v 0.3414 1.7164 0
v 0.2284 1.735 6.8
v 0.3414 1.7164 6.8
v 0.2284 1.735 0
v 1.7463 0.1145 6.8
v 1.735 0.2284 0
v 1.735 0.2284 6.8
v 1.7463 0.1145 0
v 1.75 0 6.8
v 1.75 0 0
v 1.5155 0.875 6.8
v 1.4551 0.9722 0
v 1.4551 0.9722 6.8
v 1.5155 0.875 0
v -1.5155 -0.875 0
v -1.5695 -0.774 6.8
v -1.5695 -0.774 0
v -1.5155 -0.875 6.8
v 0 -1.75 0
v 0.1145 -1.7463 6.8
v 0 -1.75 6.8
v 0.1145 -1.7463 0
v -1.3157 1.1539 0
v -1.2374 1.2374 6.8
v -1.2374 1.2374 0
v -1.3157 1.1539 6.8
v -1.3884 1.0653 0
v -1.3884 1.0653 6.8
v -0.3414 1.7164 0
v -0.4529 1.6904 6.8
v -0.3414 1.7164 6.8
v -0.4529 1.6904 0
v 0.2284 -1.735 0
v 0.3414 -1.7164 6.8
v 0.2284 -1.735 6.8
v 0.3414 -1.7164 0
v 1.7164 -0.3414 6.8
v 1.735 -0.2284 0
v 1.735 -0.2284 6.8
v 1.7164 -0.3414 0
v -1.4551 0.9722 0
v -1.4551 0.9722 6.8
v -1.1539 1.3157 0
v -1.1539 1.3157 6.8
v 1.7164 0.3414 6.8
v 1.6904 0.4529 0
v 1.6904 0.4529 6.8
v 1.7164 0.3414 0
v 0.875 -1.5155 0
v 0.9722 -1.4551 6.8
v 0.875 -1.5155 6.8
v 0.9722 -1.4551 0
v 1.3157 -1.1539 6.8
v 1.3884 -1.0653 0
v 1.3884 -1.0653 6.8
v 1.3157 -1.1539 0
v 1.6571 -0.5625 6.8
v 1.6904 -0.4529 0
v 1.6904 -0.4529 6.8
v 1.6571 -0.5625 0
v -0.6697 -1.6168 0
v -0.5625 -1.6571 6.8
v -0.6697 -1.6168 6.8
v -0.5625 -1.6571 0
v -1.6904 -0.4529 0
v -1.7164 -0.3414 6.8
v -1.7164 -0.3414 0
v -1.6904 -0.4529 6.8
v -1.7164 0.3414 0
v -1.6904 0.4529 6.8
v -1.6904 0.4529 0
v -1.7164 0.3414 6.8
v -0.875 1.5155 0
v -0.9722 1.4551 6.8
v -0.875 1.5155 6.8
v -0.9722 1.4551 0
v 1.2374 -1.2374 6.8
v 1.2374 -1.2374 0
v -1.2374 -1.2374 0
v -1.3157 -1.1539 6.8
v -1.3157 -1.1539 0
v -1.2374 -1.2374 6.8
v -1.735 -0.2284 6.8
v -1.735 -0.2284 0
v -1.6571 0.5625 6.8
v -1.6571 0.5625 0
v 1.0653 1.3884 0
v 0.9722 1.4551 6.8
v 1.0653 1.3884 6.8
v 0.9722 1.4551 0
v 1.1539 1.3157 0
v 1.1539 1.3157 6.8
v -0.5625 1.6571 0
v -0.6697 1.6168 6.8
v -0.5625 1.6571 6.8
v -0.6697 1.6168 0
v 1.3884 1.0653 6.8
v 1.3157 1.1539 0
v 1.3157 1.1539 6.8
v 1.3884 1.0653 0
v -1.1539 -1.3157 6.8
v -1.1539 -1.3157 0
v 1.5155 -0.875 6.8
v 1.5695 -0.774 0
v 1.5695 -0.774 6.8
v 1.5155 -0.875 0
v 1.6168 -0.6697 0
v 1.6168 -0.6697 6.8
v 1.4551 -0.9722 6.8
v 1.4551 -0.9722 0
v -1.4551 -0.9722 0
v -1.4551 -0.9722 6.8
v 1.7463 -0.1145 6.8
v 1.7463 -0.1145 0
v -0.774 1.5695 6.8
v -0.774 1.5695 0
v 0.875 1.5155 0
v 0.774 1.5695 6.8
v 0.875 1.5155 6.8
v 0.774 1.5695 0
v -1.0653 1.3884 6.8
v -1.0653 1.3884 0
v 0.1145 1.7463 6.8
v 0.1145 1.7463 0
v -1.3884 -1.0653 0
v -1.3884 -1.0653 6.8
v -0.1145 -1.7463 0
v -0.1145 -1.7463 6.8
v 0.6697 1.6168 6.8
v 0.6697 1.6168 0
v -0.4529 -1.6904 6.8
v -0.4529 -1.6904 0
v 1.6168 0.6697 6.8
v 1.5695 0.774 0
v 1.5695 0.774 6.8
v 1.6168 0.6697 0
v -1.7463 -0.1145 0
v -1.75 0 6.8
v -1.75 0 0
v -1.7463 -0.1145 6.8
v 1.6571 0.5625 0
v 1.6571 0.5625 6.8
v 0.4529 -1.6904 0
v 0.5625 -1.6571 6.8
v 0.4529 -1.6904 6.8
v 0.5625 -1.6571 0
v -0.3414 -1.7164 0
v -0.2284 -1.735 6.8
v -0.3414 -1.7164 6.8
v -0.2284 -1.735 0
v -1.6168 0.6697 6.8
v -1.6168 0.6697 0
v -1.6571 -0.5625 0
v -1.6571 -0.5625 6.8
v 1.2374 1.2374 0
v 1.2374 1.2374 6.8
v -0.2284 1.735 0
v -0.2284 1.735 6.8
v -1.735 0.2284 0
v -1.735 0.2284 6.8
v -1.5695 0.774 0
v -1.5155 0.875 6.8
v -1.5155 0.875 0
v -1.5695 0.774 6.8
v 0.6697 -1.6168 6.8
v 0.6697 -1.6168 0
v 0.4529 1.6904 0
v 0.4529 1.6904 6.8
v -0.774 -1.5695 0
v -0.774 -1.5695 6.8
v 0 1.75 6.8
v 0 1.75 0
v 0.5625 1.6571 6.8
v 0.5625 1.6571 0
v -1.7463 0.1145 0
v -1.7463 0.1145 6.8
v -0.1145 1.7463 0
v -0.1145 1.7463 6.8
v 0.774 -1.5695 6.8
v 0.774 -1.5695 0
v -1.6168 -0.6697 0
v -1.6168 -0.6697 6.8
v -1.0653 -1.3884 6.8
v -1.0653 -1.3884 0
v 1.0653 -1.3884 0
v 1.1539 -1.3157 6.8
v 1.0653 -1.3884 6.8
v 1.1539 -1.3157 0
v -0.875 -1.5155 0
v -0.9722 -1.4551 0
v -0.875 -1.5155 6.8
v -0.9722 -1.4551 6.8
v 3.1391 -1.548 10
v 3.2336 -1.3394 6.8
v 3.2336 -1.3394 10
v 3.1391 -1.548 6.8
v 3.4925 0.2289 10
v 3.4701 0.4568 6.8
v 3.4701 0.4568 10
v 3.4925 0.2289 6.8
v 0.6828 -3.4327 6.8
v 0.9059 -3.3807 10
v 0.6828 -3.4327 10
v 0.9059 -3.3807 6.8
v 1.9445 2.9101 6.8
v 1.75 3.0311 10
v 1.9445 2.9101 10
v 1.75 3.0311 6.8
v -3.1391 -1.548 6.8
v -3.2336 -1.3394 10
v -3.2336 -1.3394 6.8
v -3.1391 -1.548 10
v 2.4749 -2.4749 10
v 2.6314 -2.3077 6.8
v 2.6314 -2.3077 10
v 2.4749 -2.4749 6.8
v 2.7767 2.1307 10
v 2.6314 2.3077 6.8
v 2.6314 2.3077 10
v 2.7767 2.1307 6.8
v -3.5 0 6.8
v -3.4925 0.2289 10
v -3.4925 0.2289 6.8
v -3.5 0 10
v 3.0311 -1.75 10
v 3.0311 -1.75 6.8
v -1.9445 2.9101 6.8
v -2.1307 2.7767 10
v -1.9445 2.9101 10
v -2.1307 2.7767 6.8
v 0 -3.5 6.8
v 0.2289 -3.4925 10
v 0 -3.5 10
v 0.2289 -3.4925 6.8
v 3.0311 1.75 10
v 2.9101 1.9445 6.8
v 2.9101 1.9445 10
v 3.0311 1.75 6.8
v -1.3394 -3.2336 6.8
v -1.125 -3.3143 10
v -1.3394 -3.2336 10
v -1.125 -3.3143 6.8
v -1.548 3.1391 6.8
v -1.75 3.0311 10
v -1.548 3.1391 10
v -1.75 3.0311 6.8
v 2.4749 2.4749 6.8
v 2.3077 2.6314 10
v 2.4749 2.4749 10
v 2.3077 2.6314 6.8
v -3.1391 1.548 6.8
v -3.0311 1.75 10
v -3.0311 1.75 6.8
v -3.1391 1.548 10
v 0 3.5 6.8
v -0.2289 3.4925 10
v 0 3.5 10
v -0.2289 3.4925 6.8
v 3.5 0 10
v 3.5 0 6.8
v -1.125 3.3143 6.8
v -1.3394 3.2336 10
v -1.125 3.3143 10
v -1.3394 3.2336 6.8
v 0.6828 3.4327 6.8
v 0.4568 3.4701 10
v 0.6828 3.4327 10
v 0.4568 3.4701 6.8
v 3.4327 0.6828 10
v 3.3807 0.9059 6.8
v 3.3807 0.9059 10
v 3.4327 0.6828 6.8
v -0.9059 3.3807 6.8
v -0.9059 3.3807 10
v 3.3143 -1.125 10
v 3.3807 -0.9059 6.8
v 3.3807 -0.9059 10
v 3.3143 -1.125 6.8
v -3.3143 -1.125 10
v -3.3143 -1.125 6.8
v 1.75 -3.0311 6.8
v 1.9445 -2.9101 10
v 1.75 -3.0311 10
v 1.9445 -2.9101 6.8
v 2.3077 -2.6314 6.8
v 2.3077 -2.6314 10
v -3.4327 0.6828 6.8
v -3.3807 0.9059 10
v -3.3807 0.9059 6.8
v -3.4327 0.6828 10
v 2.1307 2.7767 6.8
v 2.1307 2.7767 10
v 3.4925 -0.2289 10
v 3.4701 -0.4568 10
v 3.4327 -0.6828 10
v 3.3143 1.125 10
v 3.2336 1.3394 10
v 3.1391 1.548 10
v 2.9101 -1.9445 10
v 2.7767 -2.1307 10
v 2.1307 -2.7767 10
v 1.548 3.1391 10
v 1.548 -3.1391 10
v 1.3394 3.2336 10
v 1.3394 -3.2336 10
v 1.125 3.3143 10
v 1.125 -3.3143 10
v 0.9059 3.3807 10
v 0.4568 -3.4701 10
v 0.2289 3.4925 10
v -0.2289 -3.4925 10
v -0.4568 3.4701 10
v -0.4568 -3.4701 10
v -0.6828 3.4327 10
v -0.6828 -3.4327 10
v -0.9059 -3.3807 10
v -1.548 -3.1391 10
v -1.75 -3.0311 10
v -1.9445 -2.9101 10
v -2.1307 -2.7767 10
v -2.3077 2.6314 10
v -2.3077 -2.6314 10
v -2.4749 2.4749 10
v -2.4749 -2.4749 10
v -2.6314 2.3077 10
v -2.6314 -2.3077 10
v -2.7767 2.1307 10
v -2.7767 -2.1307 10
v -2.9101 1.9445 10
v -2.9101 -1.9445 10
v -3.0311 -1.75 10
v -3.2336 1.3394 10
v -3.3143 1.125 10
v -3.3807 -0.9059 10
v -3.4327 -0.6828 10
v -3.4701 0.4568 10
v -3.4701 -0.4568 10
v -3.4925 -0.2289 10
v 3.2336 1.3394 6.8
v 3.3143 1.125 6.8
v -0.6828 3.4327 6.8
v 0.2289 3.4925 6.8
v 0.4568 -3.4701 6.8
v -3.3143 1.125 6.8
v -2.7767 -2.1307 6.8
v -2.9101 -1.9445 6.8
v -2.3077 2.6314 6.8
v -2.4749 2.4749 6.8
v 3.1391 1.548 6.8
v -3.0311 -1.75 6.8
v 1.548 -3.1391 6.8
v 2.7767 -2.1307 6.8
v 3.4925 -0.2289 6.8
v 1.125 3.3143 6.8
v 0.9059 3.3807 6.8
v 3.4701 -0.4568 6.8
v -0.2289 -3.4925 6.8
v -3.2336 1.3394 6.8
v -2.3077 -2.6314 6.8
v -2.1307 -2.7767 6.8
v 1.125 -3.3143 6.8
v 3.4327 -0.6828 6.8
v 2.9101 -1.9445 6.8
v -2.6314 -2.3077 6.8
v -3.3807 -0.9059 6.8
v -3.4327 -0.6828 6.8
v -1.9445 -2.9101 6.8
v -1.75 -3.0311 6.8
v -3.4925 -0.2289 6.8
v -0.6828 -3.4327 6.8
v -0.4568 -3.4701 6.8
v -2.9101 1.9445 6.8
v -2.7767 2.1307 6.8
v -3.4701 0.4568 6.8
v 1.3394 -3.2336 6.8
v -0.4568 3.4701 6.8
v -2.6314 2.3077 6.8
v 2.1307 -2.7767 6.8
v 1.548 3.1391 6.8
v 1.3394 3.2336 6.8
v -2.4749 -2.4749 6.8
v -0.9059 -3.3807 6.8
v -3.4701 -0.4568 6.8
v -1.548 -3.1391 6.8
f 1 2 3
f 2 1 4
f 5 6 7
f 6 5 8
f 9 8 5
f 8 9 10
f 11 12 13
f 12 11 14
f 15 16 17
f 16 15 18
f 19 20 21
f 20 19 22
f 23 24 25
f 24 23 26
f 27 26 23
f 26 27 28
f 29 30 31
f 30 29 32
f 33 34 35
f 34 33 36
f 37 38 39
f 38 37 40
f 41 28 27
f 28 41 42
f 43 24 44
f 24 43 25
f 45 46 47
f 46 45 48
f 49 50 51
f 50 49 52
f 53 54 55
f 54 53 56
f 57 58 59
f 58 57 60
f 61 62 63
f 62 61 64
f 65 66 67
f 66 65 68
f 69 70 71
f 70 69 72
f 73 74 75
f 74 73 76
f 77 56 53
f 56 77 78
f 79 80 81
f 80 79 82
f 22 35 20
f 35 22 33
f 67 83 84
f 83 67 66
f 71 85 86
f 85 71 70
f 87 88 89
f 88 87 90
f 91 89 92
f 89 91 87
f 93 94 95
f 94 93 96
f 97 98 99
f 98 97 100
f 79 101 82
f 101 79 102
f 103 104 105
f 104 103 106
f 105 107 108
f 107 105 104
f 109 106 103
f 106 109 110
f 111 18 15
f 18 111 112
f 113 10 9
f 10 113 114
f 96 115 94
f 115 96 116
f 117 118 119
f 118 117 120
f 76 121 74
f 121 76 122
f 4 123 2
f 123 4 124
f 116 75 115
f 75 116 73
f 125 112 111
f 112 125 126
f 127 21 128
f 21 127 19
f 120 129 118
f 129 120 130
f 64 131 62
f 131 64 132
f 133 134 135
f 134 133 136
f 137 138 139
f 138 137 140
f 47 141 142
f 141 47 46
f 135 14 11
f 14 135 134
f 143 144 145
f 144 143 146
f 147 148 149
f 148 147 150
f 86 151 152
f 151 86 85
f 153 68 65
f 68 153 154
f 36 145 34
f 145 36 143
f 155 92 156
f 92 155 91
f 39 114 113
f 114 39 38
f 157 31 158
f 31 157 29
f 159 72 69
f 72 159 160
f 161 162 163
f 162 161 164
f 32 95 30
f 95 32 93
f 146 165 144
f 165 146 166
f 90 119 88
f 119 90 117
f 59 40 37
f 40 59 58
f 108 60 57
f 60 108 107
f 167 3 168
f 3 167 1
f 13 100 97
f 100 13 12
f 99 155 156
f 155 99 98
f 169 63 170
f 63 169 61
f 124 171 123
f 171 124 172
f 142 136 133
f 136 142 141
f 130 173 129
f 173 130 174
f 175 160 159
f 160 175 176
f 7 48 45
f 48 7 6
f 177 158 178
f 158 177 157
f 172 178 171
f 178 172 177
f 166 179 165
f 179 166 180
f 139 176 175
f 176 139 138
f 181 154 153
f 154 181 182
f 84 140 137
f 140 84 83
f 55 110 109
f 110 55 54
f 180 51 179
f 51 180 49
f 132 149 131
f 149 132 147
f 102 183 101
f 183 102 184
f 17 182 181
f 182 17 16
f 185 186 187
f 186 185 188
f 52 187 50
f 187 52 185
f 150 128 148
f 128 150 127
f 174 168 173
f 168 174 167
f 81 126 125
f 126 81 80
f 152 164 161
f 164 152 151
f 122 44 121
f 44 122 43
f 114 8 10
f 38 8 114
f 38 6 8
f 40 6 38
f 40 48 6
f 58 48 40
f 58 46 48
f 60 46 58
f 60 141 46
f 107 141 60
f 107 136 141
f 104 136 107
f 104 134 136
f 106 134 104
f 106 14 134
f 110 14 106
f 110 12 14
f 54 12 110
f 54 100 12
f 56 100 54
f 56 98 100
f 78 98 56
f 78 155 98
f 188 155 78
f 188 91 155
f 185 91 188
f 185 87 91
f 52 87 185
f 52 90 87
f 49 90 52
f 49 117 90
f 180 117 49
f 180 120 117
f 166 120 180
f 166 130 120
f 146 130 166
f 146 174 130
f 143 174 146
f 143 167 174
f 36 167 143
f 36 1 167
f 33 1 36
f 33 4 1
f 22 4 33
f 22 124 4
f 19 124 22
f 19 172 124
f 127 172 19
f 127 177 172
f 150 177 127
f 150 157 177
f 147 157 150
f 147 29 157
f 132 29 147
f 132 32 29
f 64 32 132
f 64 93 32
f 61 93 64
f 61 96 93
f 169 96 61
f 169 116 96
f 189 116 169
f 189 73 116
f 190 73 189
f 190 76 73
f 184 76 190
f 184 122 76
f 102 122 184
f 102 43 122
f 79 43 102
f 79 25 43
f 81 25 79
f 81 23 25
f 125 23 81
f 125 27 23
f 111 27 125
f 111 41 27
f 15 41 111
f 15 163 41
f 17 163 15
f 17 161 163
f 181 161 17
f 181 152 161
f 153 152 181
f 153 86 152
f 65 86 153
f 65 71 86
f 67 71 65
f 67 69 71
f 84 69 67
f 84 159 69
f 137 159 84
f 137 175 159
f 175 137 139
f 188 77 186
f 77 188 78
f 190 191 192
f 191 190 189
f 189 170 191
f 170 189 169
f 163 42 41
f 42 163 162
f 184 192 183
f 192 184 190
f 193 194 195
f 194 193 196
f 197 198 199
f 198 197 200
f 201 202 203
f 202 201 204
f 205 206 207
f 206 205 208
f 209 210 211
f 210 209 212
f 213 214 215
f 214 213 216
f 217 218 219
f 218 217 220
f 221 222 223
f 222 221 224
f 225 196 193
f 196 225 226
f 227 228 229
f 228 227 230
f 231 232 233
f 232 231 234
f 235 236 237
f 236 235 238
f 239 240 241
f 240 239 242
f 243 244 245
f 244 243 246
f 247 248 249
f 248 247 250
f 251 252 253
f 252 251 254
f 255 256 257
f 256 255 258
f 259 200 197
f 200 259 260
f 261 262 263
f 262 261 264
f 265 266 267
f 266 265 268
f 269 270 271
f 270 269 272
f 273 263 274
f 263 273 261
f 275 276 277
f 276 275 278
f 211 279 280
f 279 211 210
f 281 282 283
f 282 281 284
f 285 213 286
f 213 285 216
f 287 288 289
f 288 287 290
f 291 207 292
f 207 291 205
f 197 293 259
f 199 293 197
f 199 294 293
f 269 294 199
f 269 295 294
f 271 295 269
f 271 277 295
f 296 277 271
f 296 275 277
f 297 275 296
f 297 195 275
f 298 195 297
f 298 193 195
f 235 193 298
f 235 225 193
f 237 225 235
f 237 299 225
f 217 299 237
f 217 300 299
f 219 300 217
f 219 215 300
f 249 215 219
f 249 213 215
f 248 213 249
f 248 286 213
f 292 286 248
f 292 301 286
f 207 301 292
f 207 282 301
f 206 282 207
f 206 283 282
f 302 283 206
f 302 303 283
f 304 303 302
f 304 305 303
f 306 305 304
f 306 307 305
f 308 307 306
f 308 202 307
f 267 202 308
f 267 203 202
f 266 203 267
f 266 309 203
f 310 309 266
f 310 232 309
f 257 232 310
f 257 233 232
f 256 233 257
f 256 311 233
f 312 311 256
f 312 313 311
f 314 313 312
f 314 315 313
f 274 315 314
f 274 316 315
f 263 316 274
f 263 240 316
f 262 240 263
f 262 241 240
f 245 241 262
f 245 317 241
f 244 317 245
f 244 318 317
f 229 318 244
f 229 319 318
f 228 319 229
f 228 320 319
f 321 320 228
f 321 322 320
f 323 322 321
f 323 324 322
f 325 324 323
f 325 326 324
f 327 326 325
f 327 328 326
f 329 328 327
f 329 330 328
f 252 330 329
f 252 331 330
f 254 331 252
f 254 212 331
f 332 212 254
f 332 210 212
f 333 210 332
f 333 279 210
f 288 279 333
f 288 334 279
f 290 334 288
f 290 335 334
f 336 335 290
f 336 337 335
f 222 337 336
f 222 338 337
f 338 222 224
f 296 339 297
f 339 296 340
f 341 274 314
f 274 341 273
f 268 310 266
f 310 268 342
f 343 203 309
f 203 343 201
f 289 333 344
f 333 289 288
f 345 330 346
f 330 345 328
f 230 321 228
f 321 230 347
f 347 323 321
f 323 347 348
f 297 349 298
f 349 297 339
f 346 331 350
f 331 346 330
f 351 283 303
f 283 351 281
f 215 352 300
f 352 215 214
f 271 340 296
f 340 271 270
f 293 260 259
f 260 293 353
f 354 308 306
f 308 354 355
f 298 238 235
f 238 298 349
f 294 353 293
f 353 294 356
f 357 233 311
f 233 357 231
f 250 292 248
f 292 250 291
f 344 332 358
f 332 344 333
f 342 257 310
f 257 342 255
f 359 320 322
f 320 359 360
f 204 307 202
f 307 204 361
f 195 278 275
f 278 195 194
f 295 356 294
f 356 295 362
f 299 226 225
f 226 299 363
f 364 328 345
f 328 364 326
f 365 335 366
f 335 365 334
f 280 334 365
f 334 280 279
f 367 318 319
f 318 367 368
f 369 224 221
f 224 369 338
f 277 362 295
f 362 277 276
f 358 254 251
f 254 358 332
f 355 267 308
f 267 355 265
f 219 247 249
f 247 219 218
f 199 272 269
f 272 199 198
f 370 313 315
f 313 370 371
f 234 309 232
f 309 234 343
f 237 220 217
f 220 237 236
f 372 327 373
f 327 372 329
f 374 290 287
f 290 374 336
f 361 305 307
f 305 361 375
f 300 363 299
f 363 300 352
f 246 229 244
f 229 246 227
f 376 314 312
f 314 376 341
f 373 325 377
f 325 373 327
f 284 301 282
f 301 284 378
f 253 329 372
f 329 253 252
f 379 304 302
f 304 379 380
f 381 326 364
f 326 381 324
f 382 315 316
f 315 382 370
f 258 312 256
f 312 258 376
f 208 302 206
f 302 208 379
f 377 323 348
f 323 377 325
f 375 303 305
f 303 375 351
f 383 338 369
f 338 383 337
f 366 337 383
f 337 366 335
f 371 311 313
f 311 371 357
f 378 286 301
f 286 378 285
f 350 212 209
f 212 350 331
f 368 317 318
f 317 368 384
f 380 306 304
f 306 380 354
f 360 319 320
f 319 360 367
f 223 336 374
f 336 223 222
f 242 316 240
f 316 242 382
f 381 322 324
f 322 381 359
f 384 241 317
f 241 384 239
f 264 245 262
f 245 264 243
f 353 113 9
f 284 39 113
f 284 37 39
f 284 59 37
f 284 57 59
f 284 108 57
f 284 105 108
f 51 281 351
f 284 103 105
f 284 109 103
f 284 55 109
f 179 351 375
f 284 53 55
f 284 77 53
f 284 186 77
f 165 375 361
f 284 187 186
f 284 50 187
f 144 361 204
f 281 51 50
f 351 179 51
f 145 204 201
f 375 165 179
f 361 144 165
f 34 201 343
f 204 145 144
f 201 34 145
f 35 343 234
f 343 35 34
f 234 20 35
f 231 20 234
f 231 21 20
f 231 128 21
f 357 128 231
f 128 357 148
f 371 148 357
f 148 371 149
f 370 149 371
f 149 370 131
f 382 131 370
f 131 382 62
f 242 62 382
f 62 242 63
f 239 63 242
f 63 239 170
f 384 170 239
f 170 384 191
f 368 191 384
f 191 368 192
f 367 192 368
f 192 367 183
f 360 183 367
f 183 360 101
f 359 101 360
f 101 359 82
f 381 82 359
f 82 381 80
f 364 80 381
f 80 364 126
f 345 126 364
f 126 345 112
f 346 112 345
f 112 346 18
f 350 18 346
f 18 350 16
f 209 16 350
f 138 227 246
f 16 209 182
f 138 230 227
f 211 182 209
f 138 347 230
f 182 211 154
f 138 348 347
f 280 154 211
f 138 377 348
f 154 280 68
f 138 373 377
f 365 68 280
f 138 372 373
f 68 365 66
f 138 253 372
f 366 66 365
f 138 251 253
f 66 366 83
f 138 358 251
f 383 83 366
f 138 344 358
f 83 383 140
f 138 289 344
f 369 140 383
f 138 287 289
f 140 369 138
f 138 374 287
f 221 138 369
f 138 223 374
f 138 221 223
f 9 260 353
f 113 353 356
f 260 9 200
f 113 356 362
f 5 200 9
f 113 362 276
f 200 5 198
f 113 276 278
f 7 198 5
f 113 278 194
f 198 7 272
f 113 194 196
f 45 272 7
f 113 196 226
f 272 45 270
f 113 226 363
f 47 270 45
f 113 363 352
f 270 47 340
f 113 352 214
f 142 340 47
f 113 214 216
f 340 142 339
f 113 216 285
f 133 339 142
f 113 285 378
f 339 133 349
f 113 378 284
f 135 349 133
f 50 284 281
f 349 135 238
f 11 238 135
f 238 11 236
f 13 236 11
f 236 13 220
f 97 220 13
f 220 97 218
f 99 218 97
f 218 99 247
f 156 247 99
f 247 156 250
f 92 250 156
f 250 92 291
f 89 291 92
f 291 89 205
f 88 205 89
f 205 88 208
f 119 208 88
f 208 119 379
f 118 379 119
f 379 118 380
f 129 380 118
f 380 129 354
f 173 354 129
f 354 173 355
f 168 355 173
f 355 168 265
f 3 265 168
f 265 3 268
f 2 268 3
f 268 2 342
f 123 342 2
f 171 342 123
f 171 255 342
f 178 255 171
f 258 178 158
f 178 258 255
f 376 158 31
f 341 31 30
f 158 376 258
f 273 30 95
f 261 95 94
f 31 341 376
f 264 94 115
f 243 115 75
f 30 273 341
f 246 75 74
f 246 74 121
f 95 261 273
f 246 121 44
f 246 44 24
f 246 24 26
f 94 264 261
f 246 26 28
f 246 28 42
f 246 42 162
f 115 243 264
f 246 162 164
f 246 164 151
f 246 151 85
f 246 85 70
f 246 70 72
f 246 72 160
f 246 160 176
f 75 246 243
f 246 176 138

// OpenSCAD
$fn = 96;

module screw(shaft_d=3.5, head_d=7.0, total_len=10.0, head_h=3.0, overlap=0.2) {
    shaft_h = total_len - head_h;

    union() {
        // Shaft (below head)
        cylinder(h=shaft_h + overlap, d=shaft_d, center=false);

        // Head (on top of shaft), slightly overlapped to ensure one connected solid
        translate([0, 0, shaft_h - overlap])
            cylinder(h=head_h + overlap, d=head_d, center=false);
    }
}

screw();
